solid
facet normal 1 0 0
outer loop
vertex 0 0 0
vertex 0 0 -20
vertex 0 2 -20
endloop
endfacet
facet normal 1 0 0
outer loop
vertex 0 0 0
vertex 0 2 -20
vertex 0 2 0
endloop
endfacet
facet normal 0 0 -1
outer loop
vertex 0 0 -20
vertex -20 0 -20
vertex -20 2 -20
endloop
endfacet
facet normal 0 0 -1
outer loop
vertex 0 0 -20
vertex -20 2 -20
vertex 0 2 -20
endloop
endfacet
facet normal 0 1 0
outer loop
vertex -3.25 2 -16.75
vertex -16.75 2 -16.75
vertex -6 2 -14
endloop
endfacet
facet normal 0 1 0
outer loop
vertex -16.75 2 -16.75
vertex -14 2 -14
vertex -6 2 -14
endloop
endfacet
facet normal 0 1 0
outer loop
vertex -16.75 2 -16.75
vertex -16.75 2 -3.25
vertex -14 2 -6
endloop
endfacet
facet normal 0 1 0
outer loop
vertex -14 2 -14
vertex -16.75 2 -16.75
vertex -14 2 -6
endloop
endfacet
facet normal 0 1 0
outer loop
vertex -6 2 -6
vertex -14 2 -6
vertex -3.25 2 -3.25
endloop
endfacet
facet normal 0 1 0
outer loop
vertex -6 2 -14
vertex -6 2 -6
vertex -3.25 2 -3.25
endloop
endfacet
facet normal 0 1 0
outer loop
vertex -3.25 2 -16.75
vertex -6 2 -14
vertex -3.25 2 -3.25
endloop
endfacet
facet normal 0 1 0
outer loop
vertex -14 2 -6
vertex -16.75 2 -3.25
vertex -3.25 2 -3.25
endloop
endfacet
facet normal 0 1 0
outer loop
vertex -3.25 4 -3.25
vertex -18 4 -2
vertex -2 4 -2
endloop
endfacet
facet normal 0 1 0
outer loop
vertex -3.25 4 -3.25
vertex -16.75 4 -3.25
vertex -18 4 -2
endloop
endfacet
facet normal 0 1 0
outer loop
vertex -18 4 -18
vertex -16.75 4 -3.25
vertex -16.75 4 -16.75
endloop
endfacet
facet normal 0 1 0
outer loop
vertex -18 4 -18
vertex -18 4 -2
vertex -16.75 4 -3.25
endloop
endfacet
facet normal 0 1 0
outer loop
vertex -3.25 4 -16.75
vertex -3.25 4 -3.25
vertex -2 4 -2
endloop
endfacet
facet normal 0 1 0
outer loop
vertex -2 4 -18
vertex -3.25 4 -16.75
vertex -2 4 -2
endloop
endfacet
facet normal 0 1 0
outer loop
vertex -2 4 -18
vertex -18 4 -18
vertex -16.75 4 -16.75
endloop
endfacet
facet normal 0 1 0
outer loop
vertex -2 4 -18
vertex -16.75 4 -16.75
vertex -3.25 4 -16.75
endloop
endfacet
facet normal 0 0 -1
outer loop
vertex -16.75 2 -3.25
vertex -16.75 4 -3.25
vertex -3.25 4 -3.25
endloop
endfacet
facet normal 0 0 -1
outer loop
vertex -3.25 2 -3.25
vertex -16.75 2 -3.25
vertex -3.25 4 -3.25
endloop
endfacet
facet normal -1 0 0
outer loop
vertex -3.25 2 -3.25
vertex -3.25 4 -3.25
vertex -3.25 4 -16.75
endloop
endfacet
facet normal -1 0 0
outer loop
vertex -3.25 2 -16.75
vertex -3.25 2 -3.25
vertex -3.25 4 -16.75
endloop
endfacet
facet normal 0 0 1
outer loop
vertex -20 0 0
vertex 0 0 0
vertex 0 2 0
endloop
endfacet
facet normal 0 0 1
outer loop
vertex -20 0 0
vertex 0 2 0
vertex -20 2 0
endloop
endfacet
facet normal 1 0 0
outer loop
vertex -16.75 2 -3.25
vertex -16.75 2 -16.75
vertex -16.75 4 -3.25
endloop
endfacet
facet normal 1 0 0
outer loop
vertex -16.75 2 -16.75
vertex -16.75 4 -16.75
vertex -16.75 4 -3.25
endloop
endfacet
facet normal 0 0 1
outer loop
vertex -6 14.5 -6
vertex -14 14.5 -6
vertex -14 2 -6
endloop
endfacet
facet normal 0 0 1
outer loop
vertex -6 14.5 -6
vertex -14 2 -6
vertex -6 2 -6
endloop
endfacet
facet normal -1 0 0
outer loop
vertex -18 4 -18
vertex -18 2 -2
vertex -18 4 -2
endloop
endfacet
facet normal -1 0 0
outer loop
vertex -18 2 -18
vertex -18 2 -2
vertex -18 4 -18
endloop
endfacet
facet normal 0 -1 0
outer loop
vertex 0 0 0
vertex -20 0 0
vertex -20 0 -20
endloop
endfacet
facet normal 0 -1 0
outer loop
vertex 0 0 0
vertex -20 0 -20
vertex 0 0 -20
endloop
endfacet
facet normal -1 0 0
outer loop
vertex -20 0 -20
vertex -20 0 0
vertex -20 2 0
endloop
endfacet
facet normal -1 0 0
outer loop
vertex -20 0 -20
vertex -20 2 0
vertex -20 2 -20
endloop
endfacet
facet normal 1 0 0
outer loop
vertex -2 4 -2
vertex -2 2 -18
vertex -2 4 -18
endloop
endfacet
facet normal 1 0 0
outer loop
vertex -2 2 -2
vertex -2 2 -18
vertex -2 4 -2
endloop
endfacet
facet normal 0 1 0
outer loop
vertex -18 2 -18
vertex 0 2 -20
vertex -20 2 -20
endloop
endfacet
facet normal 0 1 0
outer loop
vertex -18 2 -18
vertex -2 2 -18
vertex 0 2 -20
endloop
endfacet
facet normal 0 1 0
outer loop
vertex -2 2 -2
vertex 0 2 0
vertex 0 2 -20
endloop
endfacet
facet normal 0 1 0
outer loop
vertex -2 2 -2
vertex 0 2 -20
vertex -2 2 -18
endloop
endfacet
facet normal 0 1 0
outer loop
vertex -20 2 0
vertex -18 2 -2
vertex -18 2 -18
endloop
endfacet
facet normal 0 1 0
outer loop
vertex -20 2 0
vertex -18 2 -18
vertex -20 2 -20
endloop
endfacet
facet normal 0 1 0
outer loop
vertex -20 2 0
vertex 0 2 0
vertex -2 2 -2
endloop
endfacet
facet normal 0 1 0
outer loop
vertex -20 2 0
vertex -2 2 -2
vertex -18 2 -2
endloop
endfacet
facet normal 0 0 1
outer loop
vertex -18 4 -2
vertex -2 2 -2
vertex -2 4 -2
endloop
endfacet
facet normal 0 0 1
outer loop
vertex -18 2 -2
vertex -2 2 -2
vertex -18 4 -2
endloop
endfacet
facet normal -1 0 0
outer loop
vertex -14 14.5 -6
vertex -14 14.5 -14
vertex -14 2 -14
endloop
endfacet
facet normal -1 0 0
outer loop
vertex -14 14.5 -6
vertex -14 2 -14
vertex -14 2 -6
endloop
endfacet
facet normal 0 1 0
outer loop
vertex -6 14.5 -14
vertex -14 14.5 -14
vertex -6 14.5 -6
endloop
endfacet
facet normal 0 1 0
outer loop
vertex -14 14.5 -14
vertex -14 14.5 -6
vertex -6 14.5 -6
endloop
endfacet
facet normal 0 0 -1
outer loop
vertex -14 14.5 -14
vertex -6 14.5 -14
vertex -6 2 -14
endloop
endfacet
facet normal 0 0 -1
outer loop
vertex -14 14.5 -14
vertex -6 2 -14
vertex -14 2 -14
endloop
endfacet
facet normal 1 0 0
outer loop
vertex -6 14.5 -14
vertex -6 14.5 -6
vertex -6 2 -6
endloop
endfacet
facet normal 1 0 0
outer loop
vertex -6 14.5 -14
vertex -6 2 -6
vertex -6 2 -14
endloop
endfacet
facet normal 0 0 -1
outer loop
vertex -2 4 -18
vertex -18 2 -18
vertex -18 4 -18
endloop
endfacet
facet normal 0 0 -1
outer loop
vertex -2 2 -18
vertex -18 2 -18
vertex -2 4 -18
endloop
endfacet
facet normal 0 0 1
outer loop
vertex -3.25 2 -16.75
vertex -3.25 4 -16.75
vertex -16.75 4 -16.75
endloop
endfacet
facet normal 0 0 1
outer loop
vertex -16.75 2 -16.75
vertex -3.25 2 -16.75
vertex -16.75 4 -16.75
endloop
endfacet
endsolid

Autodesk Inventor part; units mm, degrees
ref_plane "YZ Plane" through (0, 0, 0) normal (1, 0, 0) x (0, 1, 0)
ref_plane "XZ Plane" through (0, 0, 0) normal (0, 1, 0) x (-1, 0, 0)
ref_plane "XY Plane" through (0, 0, 0) normal (0, 0, 1) x (1, 0, 0)
sketch "Sketch1" plane through (0, 0, 0) normal (0, 1, 0) x (-1, 0, 0)
  line L0 (0, 0) -> (20, 0)
  line L1 (20, 0) -> (20, -20)
  line L2 (20, -20) -> (0, -20)
  line L3 (0, -20) -> (0, 0)
  dimension "d0" = 20
  dimension "d1" = 20
extrude "Extrusion1" add sketch "Sketch1" along normal blind 2
sketch "Sketch2" plane through (0, 2, 0) normal (0, 1, 0) x (1, 0, 0)
  line L0 (0, 20) -> (-20, 20) projected
  line L1 (-20, 20) -> (-20, 0) projected
  line L2 (-20, 0) -> (0, 0) projected
  line L3 (0, 0) -> (0, 20) projected
  line L4 (-18, 2) -> (-18, 18)
  line L5 (-18, 18) -> (-2, 18)
  line L6 (-2, 18) -> (-2, 2)
  line L7 (-2, 2) -> (-18, 2)
  line L8 (-16.75, 16.75) -> (-16.75, 3.25)
  line L9 (-16.75, 3.25) -> (-3.25, 3.25)
  line L10 (-3.25, 3.25) -> (-3.25, 16.75)
  line L11 (-3.25, 16.75) -> (-16.75, 16.75)
  dimension "d4" = 2
  dimension "d5" = 1.25
extrude "Extrusion2" add sketch "Sketch2" along normal blind 2 contours L4 L5 L6 L7
extrude "Extrusion3" cut sketch "Sketch2" against normal blind 10 contours L11 L10 L9 L8
sketch "Sketch3" plane through (0, 0, 0) normal (0, -1, 0) x (1, 0, 0)
  line L0 (-3.25, -3.25) -> (-3.25, -16.75) projected
  line L1 (-3.25, -16.75) -> (-16.75, -16.75) projected
  line L2 (-16.75, -16.75) -> (-16.75, -3.25) projected
  line L3 (-16.75, -3.25) -> (-3.25, -3.25) projected
  line L4 (0, -20) -> (-20, -20) projected
  line L5 (0, 0) -> (0, -20) projected
  line L6 (-20, 0) -> (0, 0) projected
  line L7 (-20, -20) -> (-20, 0) projected
  line L8 (-6, -6) -> (-6, -14)
  line L9 (-6, -14) -> (-14, -14)
  line L10 (-14, -14) -> (-14, -6)
  line L11 (-14, -6) -> (-6, -6)
extrude "Extrusion4" add sketch "Sketch3" against normal up to surface (2 mm away) contours L0 L1 L2 L3
extrude "Extrusion5" add sketch "Sketch3" against normal blind 11.5 contours L8 L9 L10 L11
move faces "Move1" translate (0, 3, 0) faces at (-11.3333, 11.5, -8.6667)
properties part number "latticeChamberCapv4"
